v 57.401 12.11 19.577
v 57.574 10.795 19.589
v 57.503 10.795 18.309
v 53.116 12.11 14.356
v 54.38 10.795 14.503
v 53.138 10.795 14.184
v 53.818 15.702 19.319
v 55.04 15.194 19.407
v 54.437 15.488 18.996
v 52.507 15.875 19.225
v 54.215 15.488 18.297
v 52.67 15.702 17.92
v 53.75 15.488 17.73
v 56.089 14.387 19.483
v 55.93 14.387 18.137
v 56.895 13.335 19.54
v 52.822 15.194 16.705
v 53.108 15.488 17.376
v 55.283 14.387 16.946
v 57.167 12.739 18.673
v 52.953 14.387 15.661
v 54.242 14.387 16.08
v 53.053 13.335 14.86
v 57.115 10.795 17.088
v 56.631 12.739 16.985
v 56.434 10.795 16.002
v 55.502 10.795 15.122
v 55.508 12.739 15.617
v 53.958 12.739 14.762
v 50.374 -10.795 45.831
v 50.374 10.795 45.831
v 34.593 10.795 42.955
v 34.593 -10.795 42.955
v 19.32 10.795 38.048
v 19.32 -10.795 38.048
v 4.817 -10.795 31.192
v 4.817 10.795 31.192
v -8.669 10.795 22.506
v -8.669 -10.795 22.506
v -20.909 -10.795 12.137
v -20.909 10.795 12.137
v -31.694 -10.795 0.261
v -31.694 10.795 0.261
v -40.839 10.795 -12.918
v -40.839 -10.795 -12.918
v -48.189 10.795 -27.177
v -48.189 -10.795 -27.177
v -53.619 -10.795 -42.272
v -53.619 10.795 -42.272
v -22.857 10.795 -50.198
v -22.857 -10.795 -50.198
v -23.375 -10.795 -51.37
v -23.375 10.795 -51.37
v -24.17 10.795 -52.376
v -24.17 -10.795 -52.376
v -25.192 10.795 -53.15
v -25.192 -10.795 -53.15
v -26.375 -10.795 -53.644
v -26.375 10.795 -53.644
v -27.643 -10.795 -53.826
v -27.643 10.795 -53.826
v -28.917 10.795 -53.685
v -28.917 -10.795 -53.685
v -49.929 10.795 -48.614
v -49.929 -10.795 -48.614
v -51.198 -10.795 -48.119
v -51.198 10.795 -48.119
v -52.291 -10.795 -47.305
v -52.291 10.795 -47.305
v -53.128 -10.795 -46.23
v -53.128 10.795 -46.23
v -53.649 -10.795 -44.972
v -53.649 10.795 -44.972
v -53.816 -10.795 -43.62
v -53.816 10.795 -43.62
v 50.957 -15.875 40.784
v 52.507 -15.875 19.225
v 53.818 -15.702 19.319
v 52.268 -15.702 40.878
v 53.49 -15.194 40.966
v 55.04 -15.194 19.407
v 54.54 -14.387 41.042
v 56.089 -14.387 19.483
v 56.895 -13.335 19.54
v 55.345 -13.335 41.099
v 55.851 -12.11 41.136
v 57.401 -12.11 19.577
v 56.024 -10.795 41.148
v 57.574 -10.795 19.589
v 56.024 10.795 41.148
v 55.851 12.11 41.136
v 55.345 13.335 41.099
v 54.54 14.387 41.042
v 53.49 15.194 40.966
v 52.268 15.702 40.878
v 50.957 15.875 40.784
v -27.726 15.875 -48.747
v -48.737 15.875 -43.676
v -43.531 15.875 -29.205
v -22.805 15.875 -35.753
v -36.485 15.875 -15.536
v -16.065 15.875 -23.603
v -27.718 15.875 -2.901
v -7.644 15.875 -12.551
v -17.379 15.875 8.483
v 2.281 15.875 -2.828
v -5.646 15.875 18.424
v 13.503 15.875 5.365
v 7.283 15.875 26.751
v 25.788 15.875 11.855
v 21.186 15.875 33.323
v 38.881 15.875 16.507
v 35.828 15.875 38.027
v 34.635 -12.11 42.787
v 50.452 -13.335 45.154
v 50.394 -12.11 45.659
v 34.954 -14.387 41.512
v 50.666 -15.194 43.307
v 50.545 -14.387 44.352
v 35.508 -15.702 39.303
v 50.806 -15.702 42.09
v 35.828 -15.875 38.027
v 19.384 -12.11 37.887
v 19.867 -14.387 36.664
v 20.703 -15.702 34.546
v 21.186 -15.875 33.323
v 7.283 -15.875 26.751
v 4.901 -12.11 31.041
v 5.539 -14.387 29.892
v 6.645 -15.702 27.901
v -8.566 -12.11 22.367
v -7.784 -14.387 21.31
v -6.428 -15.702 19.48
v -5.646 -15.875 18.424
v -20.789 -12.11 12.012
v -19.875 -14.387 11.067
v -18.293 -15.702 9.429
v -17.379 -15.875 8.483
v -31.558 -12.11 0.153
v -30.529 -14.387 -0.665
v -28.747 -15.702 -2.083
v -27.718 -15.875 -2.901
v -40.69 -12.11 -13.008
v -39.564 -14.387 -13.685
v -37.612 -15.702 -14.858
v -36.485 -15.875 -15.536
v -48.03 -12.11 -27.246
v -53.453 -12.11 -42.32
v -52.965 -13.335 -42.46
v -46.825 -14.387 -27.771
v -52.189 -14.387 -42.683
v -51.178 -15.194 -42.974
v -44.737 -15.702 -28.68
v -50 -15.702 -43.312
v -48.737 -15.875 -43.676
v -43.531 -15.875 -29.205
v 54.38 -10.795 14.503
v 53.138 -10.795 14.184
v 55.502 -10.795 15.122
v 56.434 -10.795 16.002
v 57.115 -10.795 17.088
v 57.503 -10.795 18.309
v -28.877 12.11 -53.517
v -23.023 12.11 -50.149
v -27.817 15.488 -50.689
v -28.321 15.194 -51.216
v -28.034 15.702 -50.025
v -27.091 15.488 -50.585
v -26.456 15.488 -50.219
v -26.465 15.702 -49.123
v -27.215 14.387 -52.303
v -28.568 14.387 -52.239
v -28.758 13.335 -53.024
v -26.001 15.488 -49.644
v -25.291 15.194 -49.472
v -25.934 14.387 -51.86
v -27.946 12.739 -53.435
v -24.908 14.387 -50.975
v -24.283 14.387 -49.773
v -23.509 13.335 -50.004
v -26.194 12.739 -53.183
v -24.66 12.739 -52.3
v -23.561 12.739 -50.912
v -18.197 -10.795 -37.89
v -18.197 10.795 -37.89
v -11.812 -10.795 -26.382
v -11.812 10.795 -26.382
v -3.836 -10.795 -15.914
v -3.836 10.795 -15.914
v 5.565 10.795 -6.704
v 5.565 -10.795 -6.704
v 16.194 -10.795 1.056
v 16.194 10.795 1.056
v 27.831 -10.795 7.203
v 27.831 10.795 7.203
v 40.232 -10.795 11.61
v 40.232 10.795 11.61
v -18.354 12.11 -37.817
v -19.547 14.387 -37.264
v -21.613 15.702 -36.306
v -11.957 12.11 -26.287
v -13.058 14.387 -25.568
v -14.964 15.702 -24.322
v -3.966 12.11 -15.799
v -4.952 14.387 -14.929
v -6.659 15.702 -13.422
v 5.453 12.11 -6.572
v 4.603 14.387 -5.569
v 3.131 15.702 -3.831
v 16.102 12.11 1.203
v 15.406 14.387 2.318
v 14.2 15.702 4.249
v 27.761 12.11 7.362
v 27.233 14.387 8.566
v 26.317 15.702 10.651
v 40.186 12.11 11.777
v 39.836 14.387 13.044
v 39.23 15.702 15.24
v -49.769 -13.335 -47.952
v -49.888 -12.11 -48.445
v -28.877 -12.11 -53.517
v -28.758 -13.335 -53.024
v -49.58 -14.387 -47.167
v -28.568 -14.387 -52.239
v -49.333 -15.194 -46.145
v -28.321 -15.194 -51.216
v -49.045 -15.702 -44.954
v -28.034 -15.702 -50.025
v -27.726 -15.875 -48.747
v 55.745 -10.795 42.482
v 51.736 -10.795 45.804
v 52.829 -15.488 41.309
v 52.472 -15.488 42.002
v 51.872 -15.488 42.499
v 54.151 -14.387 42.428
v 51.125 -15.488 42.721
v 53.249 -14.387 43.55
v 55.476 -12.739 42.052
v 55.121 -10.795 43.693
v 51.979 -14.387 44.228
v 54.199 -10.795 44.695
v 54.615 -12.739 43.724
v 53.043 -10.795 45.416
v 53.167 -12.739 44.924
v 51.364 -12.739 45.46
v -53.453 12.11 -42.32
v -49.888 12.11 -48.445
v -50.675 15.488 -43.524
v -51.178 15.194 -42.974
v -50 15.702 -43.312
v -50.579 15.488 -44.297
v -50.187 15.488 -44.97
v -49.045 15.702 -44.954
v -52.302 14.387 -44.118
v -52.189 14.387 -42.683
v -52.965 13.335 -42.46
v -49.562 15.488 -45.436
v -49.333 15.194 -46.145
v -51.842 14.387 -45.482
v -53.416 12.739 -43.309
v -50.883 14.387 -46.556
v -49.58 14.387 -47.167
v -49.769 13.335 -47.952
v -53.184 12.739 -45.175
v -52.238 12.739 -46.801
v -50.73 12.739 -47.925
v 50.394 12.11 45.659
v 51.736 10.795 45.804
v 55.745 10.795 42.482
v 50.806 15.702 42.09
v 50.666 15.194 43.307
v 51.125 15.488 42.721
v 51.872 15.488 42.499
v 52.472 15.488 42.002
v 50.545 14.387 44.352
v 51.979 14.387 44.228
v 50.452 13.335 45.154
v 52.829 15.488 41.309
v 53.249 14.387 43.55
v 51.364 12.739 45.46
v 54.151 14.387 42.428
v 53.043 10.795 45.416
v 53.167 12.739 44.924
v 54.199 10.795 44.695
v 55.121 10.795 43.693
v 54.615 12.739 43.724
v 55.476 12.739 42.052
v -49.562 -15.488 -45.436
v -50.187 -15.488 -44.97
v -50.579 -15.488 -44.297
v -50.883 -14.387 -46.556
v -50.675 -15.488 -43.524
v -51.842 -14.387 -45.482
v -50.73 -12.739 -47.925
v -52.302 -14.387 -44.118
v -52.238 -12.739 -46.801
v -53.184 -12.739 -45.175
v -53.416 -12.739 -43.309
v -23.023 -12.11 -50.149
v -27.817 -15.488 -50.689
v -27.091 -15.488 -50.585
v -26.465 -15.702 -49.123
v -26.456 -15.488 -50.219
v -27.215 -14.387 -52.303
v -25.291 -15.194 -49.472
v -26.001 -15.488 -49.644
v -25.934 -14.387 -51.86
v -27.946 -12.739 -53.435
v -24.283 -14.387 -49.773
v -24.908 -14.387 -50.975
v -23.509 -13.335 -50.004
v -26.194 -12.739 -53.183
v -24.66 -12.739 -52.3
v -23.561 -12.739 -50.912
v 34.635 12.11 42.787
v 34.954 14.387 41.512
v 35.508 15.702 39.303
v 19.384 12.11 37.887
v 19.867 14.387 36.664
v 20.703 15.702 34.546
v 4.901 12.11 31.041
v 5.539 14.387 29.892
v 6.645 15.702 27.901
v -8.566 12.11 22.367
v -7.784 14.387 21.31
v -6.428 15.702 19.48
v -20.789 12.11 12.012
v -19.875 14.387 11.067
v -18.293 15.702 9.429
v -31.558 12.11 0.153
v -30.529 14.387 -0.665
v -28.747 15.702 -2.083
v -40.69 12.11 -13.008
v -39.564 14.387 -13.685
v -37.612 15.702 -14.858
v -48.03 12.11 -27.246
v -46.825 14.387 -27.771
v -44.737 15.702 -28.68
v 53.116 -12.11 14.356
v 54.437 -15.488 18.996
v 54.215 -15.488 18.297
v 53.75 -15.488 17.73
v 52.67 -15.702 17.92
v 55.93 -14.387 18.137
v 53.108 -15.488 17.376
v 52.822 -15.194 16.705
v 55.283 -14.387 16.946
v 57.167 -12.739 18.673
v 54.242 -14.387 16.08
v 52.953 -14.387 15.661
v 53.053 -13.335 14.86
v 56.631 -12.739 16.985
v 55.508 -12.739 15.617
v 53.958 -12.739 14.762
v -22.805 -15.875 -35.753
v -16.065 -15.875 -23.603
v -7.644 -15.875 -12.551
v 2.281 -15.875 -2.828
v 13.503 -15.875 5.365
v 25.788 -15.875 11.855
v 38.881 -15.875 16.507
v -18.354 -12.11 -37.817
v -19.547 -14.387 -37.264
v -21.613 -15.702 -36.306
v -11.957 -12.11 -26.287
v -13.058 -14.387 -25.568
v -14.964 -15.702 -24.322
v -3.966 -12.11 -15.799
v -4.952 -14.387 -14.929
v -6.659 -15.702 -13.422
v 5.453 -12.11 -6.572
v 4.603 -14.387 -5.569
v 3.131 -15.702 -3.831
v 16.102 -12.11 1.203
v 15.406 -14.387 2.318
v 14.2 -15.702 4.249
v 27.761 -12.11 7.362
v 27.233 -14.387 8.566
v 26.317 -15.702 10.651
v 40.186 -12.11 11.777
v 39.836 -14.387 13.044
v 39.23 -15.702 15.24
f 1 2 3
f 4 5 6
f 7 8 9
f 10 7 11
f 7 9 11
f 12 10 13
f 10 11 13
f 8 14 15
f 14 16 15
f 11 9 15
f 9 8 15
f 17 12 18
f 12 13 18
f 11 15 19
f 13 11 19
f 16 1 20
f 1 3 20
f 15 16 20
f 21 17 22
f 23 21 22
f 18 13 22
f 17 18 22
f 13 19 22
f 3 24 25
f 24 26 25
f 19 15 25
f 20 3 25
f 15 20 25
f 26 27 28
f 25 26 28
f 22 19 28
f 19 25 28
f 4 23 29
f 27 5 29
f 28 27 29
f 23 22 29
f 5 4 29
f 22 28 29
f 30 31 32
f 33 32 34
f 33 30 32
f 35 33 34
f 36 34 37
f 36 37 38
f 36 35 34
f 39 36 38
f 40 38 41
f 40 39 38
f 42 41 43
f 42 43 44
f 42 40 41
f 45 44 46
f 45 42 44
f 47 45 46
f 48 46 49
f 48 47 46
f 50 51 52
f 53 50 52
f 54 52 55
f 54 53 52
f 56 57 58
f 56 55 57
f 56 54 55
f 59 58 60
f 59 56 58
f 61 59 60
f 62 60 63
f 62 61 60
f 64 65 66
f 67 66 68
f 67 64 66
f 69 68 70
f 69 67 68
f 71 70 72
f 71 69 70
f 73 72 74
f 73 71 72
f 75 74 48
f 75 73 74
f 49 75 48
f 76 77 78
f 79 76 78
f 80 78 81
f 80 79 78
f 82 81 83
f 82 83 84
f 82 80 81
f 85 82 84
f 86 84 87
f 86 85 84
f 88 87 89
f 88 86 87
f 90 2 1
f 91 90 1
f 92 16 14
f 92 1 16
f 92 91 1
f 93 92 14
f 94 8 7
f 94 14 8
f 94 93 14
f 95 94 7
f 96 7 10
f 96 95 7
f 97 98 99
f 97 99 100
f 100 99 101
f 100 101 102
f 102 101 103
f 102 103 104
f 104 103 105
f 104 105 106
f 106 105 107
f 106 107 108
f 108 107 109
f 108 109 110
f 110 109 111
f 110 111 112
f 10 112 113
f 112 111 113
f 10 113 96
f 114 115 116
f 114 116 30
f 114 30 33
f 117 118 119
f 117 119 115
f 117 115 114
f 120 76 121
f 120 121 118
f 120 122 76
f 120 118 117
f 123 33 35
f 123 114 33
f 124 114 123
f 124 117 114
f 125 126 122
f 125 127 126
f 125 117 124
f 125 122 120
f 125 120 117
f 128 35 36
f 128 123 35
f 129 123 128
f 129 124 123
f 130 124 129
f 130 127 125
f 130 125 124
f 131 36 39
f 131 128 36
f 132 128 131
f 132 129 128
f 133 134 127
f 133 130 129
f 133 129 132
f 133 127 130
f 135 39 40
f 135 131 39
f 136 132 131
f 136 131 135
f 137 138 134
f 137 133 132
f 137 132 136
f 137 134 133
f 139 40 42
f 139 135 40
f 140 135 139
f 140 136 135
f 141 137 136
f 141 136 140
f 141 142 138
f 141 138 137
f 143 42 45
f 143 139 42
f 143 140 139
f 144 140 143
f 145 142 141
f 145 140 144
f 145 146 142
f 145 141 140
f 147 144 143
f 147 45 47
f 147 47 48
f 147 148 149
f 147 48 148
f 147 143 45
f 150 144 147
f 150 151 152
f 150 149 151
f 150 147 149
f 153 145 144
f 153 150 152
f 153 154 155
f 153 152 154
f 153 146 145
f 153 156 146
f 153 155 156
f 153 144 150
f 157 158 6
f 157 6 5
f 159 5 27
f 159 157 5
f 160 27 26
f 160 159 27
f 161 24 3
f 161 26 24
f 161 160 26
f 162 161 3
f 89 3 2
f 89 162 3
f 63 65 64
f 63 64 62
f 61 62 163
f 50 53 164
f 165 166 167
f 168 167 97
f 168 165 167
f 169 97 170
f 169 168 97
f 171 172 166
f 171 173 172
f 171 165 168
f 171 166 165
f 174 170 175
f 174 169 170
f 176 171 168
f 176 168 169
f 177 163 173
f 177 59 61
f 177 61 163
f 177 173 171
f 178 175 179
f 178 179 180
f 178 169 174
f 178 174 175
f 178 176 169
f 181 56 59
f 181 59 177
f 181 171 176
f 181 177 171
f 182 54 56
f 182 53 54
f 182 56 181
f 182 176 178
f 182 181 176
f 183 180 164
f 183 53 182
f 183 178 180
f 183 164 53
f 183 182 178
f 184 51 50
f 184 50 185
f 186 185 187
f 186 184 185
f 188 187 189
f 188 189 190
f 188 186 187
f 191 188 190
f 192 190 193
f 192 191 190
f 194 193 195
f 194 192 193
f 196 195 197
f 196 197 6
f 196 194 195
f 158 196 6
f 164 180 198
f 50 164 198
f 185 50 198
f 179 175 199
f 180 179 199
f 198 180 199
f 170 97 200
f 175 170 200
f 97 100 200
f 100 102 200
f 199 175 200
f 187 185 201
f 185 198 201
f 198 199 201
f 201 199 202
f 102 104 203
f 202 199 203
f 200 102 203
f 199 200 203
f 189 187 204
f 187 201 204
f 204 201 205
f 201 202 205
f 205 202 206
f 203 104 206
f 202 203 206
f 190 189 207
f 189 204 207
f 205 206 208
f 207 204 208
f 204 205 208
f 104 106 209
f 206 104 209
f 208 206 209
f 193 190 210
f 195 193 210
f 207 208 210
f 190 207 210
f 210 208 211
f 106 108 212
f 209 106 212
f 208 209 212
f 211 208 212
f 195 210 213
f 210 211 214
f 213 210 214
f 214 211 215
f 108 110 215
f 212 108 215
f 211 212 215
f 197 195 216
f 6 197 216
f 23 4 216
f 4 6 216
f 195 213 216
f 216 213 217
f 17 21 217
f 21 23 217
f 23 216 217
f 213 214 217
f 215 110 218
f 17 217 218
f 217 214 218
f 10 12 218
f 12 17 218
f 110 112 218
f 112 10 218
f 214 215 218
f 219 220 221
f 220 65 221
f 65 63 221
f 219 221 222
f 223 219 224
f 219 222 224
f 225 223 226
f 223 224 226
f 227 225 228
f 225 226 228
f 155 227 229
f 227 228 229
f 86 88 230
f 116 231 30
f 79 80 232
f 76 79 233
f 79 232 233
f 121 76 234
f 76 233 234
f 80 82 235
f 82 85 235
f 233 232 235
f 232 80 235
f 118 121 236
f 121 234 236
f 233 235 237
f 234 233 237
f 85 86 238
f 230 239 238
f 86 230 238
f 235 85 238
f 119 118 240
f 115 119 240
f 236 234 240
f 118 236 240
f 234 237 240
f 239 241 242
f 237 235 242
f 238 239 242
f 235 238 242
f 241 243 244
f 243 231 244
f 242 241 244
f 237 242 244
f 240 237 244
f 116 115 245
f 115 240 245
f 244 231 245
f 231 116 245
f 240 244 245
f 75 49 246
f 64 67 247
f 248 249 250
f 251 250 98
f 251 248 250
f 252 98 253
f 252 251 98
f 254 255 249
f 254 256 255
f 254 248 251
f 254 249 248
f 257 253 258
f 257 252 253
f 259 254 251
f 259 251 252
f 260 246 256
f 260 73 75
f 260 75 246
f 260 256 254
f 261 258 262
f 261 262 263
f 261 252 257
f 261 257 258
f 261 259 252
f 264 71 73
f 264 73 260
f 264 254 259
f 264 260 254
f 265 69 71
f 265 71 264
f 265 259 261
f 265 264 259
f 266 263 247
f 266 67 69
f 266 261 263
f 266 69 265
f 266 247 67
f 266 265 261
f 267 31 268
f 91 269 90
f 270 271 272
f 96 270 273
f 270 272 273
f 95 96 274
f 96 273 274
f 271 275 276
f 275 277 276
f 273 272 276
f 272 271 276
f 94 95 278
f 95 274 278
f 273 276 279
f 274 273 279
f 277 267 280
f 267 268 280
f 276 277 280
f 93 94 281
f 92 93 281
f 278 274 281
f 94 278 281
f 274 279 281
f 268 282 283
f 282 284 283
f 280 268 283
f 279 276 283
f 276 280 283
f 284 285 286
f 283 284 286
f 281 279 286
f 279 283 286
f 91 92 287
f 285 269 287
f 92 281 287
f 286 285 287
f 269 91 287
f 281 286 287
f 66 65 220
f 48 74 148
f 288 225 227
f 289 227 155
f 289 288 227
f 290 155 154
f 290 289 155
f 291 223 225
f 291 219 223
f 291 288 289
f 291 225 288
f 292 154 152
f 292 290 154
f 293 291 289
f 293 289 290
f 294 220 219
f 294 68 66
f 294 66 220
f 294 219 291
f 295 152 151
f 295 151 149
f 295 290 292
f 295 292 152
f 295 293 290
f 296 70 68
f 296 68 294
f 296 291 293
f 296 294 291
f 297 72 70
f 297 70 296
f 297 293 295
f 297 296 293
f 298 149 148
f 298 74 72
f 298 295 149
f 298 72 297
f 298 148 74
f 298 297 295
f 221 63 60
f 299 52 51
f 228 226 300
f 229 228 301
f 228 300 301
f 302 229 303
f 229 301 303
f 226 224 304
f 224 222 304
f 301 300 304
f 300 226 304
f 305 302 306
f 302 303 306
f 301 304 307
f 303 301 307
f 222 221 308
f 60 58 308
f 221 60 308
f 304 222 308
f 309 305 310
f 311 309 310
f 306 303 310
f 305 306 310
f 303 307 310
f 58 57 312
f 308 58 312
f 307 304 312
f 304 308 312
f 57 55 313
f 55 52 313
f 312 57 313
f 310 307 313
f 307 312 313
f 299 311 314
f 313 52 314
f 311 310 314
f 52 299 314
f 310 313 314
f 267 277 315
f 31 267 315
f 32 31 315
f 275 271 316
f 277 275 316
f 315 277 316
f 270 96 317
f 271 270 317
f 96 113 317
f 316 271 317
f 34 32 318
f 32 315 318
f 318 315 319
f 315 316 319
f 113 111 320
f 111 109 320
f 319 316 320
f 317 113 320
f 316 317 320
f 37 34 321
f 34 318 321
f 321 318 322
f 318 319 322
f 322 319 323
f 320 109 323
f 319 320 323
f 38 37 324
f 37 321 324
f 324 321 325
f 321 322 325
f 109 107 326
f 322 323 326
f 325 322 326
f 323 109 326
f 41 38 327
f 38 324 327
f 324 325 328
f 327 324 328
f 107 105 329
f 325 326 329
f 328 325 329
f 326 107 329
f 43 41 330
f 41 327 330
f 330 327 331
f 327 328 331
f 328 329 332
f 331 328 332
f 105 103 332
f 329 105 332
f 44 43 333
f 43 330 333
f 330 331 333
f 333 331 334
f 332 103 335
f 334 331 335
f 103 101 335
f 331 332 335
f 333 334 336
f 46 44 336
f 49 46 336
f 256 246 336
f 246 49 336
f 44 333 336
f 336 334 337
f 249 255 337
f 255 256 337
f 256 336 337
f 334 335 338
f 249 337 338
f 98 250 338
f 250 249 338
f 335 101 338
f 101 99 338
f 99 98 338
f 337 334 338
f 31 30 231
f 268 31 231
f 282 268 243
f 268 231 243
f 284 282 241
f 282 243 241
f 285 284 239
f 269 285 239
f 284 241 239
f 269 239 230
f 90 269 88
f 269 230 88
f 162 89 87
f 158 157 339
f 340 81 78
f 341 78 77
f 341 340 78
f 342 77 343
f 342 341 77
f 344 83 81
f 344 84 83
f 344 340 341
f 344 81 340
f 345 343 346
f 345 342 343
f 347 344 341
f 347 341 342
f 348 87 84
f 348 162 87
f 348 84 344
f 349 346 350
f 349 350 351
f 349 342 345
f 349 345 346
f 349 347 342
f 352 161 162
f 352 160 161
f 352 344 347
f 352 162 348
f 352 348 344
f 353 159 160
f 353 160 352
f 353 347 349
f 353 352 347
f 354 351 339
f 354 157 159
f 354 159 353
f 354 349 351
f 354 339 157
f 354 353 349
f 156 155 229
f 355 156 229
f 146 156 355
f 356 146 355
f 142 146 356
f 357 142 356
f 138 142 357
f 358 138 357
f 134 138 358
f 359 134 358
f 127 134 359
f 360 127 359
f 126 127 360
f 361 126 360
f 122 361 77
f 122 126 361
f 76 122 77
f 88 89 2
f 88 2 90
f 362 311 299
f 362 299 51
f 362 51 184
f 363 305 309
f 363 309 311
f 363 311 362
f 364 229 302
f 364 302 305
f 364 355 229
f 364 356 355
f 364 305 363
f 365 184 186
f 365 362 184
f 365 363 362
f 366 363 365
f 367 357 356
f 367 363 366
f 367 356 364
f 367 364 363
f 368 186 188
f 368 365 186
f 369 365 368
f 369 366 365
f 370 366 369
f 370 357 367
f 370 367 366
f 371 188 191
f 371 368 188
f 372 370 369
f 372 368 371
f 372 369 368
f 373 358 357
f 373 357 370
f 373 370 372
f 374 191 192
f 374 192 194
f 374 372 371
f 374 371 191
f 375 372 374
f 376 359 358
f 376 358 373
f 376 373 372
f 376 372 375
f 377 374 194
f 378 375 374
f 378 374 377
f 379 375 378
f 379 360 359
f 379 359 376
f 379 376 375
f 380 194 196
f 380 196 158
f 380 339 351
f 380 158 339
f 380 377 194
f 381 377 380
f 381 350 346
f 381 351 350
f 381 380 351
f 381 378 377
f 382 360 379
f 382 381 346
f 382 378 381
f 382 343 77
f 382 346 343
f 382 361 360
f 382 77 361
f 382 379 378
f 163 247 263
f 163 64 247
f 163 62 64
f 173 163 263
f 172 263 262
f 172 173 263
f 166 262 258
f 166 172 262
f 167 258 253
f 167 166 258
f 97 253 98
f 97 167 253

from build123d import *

# Parameters (mm, degrees)
F1_DEPTH = 15.875
F2_R     = 5.08


with BuildPart() as f1:
    # F0 (on Front) → F1 (new body, symmetric)
    with BuildSketch(Plane.XZ):
        with BuildLine():
            ThreePointArc((-24.109727, -54.845564), (5.564563, -6.703762), (57.928178, 14.656209))
            Line((57.928178, 14.656209), (55.651654, 46.32449))
            ThreePointArc((55.651654, 46.32449), (-14.958741, 17.521359), (-54.973422, -47.396077))
            Line((-54.973422, -47.396077), (-24.109727, -54.845564))
        make_face()
    extrude(amount=F1_DEPTH, both=True)

    # F2
    f2_edges = [f1.edges().sort_by_distance(p)[0] for p in [
        (-14.958741, -15.875, 17.521359),
        (5.564563, -15.875, -6.703762),
        (57.928178, 0, 14.656209),
        (56.789916, 15.875, 30.490349),
        (55.651654, 0, 46.32449),
        (56.789916, -15.875, 30.490349),
        (-14.958741, 15.875, 17.521359),
        (5.564563, 15.875, -6.703762),
        (-24.109727, 0, -54.845564),
        (-39.541574, 15.875, -51.12082),
        (-54.973422, 0, -47.396077),
        (-39.541574, -15.875, -51.12082),
    ]]
    fillet(f2_edges, radius=F2_R)


solid = f1.part
